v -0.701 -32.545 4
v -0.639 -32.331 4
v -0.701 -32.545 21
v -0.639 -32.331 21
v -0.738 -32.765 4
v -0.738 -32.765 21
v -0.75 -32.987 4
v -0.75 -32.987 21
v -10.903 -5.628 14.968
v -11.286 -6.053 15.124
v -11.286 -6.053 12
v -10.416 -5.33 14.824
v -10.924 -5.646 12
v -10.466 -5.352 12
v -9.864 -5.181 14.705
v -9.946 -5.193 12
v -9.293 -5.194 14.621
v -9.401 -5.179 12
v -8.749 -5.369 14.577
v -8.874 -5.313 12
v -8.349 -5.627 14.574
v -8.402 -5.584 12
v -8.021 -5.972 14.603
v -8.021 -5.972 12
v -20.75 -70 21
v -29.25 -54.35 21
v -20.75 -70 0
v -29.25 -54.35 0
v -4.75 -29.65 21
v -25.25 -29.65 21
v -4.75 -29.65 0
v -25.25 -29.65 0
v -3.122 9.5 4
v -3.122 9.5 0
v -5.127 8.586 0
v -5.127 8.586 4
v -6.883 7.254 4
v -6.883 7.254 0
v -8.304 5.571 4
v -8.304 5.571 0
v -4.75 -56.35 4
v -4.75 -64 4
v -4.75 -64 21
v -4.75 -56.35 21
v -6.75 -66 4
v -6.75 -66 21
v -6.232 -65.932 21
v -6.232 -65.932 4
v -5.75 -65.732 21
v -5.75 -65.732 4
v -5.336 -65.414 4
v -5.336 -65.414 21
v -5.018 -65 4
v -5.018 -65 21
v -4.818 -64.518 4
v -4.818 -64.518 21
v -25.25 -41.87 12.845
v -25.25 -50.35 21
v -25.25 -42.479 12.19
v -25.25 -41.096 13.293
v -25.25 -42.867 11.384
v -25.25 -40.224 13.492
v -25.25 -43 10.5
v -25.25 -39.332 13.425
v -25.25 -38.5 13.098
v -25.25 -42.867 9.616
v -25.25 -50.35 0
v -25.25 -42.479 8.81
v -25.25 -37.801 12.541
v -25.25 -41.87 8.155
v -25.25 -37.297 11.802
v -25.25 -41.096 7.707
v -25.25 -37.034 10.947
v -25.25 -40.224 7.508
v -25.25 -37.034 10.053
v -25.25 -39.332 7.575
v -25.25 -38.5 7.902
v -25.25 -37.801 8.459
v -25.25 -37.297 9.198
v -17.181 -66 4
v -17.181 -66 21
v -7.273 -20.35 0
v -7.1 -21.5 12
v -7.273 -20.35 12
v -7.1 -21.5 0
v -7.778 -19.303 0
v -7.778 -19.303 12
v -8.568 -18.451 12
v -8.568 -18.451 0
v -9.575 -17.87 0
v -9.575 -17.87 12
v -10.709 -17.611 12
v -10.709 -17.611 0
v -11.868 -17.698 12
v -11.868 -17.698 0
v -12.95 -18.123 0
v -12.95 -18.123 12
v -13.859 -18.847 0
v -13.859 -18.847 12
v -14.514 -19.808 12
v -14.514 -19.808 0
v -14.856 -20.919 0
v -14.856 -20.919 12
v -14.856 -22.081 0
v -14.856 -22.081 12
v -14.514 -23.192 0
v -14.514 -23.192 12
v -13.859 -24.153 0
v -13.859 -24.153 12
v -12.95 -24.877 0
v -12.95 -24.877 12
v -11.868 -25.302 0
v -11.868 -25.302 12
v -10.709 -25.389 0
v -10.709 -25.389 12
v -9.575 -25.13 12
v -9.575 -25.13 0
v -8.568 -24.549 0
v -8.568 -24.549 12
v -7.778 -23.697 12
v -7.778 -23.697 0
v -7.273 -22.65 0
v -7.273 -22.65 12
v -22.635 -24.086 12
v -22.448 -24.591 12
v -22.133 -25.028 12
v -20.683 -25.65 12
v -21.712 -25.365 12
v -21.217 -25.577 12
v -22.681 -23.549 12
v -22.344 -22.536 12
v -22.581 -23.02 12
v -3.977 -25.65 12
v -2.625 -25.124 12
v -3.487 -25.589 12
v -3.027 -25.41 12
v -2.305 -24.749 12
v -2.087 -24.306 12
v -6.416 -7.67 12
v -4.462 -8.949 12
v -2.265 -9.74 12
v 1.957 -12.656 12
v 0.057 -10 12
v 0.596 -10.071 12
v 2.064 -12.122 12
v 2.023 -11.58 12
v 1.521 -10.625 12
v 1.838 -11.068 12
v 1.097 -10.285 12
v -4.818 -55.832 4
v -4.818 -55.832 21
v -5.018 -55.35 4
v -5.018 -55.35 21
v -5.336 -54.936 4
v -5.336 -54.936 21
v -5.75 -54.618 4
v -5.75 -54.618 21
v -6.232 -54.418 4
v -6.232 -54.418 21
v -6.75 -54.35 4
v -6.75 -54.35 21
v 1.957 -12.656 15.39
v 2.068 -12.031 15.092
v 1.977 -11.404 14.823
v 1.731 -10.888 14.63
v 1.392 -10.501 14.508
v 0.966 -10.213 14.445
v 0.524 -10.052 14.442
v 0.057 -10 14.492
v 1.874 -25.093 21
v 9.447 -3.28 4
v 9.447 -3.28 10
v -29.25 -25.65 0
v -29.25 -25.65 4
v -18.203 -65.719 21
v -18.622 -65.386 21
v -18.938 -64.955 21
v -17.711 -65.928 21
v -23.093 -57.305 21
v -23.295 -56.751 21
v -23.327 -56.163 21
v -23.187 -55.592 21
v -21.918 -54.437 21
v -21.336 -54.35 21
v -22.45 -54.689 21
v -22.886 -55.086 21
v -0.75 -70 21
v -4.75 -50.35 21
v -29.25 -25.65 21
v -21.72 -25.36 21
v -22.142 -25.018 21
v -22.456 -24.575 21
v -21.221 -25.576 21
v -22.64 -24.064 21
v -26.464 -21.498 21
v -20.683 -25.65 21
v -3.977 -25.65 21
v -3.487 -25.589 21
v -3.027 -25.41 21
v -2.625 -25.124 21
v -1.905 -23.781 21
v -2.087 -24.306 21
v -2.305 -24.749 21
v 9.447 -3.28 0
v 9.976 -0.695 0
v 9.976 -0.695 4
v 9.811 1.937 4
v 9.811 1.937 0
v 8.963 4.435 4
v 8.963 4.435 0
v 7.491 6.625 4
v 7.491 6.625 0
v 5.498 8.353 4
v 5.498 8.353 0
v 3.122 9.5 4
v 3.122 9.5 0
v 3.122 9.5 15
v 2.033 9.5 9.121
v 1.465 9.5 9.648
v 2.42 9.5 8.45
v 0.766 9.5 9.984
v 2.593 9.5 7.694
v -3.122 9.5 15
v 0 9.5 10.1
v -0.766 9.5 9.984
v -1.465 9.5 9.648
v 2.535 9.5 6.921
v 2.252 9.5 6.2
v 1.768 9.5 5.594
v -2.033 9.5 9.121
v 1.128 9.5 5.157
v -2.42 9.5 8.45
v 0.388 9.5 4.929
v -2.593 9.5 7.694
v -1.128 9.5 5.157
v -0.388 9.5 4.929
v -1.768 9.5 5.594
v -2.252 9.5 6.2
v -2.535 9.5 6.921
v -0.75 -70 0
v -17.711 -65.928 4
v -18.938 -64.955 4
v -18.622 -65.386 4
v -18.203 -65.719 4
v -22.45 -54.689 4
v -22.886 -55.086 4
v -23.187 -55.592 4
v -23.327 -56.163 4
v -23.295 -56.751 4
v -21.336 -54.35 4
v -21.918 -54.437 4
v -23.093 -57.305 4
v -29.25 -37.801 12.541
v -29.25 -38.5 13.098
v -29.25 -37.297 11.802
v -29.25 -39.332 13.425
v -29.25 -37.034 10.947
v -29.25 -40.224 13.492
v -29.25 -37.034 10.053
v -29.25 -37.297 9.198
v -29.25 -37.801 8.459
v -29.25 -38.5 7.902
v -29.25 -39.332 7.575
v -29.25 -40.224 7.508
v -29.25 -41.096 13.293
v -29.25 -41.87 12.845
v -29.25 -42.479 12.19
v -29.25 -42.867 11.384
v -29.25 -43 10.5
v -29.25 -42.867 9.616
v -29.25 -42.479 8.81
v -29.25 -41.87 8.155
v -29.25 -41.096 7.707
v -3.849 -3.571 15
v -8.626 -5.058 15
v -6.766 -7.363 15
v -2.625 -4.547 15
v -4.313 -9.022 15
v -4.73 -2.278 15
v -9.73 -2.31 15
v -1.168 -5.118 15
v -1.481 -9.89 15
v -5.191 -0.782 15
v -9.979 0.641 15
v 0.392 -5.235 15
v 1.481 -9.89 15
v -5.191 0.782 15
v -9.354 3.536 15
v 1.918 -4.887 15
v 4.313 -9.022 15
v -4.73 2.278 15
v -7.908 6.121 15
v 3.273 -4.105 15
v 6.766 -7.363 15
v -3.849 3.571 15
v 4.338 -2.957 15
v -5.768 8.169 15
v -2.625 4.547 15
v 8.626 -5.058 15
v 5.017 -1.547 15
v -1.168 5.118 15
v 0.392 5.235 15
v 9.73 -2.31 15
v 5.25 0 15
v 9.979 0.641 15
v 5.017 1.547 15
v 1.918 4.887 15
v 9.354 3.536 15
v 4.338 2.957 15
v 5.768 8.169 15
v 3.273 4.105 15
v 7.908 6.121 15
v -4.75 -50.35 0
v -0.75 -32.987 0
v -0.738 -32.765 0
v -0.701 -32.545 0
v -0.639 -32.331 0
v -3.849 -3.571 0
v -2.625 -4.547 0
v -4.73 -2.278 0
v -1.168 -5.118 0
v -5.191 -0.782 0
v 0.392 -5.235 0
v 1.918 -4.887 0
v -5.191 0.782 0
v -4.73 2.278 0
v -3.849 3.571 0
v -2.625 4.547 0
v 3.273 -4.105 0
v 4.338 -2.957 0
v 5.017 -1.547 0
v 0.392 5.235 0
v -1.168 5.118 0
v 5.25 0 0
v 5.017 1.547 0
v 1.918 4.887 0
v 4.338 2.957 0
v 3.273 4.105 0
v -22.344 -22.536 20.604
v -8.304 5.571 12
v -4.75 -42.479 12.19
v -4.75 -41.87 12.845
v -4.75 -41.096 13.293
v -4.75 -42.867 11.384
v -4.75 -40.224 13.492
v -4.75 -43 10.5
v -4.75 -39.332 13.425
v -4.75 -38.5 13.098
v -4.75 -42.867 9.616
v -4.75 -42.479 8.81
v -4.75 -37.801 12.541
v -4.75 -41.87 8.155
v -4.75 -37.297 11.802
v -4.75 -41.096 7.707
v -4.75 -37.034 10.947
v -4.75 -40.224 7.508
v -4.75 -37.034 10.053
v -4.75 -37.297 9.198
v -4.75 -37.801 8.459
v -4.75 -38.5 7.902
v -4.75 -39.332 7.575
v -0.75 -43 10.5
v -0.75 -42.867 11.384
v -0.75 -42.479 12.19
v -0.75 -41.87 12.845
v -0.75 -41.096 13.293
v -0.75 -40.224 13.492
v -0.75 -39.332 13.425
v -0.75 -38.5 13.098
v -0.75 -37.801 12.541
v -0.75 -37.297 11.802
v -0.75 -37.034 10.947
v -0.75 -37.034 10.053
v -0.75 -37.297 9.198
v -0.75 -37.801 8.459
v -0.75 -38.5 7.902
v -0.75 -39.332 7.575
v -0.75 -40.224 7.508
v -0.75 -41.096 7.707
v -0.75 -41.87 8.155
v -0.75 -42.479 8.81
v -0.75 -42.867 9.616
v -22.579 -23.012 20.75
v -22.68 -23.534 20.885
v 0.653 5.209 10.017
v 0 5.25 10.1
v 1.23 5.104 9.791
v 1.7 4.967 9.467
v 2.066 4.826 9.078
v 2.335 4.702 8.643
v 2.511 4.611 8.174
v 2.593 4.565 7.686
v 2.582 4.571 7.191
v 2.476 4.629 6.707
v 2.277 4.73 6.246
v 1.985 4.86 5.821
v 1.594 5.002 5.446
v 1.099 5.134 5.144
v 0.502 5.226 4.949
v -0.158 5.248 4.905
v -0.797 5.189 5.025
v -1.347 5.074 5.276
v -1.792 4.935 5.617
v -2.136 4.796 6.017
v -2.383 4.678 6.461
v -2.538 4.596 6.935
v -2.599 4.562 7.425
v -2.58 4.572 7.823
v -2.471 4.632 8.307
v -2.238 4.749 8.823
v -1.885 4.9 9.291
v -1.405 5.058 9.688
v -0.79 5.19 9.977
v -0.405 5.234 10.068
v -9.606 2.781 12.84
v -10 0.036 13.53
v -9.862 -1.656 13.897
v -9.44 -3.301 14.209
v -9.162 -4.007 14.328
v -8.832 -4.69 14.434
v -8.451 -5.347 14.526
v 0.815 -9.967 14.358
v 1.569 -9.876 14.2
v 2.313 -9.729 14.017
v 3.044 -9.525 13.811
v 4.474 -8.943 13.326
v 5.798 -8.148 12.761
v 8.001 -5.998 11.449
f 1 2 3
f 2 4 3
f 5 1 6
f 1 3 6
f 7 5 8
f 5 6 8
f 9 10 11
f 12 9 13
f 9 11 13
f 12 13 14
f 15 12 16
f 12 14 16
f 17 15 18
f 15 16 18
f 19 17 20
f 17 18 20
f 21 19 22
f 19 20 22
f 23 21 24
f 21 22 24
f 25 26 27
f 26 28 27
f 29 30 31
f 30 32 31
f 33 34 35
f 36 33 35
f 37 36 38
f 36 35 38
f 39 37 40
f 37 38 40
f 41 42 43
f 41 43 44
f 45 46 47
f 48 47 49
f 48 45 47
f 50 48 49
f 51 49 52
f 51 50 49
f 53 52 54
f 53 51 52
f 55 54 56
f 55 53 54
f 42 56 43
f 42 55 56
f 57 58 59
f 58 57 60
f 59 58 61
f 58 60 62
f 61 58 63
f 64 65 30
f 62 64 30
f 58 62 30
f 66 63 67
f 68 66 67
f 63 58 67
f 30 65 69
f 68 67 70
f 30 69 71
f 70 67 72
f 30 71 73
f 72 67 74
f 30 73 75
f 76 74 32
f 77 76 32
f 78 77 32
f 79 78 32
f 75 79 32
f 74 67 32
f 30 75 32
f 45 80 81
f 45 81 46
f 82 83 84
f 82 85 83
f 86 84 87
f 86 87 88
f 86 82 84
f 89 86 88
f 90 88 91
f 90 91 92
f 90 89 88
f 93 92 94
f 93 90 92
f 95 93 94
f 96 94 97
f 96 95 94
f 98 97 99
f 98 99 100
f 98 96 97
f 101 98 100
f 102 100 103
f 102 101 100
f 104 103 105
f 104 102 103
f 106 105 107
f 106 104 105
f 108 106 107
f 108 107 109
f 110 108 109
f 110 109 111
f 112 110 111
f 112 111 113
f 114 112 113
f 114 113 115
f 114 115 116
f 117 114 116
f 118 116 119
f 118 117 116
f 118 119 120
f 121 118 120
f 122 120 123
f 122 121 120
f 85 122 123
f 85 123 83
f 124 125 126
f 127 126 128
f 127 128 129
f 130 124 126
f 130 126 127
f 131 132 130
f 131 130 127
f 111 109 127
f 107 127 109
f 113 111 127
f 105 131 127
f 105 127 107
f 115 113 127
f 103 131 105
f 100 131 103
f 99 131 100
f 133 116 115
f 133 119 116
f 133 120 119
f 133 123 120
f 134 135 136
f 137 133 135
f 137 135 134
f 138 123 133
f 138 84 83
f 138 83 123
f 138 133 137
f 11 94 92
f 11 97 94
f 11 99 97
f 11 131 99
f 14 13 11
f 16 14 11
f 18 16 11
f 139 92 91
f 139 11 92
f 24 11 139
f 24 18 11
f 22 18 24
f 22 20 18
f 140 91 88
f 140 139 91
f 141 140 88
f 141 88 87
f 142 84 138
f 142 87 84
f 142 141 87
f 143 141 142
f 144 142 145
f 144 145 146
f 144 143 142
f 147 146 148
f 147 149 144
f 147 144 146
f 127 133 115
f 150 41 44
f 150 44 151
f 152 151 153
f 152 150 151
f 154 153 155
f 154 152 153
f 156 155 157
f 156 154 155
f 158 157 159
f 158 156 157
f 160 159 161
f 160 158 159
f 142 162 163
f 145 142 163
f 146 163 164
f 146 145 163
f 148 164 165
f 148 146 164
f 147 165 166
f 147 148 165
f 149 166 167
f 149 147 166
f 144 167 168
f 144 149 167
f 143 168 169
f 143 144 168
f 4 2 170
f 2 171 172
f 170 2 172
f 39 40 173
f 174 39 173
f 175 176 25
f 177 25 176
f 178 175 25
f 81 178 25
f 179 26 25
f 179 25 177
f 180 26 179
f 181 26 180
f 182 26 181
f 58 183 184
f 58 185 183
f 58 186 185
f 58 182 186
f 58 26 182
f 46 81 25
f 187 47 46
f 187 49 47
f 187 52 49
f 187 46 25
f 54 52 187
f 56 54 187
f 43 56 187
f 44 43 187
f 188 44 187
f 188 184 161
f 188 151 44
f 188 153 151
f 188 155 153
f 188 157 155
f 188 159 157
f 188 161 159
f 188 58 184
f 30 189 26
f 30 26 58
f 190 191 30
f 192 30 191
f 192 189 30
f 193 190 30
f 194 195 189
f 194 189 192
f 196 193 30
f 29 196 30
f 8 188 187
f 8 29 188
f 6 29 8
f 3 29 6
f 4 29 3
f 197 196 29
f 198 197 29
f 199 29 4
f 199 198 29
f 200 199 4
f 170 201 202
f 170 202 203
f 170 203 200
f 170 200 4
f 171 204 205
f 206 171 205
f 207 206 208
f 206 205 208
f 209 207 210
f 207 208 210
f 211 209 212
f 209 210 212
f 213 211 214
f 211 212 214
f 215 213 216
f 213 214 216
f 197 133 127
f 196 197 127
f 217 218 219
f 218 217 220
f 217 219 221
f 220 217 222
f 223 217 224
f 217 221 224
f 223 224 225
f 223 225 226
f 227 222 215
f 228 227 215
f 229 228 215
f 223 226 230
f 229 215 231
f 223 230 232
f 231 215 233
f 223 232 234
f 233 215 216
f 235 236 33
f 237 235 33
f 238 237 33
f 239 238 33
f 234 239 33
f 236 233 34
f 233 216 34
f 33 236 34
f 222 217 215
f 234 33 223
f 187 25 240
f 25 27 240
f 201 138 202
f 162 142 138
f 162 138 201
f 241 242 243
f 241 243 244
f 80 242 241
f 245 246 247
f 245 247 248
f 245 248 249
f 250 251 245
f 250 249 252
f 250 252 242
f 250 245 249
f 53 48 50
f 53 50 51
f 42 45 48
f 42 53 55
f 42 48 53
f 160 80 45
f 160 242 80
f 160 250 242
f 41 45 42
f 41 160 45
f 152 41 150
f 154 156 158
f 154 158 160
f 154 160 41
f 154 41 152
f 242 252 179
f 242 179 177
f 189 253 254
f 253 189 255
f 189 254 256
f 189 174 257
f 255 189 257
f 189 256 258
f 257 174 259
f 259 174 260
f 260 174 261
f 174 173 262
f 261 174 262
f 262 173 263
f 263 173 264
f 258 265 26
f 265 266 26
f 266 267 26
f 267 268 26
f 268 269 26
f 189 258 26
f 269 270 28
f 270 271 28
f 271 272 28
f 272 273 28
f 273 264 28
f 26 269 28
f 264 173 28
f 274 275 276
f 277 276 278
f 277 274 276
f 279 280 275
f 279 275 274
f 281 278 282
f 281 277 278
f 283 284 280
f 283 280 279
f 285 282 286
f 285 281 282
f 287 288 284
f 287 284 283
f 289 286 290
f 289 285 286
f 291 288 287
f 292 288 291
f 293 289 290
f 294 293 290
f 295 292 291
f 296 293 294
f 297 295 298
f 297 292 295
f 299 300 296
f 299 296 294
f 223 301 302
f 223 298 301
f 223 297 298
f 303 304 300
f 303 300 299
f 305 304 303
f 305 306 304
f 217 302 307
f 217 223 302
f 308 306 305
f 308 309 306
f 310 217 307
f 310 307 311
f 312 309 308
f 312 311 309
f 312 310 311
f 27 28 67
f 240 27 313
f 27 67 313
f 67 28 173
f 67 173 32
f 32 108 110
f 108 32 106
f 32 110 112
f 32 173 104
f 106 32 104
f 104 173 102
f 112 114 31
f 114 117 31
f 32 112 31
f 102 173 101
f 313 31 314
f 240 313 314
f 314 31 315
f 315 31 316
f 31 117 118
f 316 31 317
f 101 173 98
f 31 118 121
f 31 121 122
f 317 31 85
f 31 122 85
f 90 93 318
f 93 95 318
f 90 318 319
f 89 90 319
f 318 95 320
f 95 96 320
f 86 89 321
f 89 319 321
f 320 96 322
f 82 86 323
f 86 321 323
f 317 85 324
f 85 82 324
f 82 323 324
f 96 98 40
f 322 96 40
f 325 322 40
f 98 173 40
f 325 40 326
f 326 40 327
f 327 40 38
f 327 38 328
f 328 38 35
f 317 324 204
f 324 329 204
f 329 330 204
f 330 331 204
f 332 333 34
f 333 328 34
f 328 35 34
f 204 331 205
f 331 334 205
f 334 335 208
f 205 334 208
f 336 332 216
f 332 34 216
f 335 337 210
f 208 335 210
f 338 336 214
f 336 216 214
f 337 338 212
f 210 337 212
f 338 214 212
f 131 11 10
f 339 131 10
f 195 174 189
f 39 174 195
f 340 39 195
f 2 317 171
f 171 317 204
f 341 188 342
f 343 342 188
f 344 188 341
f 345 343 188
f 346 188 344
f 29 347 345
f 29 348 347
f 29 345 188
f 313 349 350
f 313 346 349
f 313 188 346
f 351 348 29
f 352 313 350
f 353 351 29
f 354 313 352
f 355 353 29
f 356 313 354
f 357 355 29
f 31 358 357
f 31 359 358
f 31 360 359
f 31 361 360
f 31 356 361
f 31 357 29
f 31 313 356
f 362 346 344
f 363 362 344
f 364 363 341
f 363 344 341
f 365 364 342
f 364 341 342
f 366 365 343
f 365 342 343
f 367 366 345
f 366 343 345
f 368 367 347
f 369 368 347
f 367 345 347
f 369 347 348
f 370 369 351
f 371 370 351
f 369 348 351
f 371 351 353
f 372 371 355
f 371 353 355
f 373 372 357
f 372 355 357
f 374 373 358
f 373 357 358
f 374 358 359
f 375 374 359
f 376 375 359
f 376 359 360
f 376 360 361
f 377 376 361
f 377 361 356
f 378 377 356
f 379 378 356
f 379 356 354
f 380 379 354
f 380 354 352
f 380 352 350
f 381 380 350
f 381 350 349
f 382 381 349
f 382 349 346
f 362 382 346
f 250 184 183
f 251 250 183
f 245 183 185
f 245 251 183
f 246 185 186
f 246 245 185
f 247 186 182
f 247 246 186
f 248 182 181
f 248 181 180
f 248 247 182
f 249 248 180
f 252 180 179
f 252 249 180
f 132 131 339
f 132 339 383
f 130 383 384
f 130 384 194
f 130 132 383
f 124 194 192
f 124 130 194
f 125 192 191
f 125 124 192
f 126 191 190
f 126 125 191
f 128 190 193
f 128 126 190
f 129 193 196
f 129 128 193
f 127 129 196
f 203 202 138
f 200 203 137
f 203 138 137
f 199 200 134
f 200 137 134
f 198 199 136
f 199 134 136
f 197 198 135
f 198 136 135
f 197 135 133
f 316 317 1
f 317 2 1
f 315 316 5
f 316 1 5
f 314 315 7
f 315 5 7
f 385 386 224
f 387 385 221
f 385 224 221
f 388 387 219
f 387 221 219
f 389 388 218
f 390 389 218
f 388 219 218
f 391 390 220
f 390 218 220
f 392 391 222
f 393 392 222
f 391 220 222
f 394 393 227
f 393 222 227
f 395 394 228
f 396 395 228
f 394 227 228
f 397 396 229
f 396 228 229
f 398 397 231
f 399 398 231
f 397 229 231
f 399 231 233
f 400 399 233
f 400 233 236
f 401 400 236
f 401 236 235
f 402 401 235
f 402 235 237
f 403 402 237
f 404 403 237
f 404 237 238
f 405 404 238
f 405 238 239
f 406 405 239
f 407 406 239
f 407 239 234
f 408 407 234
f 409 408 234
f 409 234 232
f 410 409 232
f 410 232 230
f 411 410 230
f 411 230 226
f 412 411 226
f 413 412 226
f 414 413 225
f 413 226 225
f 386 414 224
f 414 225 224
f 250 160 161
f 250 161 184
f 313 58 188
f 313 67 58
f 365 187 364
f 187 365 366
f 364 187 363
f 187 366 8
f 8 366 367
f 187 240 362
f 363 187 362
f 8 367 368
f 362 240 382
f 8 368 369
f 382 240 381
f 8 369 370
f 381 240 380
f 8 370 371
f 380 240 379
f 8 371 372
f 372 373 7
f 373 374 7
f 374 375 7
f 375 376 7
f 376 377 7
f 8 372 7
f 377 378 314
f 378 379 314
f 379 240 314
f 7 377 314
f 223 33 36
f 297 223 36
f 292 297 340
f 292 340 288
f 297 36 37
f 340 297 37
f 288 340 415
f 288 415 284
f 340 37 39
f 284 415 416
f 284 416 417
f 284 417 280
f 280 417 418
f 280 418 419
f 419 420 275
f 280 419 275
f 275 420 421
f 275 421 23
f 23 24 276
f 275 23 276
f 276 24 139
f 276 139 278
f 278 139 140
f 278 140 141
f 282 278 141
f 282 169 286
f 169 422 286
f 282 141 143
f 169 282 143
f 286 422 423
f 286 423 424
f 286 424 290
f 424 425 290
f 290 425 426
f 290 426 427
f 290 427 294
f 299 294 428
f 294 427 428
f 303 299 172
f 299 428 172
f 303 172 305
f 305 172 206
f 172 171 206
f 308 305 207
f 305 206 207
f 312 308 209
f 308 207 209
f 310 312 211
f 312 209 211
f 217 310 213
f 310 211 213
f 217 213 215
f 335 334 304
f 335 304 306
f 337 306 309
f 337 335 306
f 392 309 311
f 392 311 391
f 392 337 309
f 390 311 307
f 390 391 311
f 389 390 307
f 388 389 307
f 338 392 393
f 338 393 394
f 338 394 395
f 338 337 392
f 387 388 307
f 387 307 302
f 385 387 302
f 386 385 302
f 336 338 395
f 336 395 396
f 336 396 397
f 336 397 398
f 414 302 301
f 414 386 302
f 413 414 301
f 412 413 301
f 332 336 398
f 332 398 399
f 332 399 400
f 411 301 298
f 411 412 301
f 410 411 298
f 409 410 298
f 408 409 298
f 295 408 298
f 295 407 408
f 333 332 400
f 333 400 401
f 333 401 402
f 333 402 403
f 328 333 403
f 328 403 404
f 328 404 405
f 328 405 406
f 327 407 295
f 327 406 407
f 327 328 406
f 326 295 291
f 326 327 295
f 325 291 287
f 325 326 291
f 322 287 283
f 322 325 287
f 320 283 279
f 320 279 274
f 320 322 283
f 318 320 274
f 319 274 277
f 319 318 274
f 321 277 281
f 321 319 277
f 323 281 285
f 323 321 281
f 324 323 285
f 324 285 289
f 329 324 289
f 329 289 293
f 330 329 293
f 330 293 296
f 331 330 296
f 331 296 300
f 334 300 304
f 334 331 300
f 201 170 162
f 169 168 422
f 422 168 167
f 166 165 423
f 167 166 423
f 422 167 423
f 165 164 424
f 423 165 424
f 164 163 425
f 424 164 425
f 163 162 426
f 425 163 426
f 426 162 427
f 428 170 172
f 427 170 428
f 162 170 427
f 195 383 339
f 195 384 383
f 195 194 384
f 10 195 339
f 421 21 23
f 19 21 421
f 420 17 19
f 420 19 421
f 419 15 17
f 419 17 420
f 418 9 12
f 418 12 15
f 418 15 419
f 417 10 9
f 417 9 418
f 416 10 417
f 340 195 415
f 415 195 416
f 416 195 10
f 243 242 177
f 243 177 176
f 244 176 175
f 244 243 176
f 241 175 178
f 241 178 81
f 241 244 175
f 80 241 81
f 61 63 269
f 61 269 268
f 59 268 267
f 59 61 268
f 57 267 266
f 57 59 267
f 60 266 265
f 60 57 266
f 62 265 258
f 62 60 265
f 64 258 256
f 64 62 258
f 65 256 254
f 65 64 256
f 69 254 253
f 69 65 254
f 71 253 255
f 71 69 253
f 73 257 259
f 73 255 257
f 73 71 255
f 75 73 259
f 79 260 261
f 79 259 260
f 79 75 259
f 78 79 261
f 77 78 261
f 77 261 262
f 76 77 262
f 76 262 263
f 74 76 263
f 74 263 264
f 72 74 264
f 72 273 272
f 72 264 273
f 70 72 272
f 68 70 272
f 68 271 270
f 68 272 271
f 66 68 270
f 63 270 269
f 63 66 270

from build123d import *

# Parameters (mm, degrees)
SKETCH1_R               = 5.25
SKETCH1_R_2             = 3.9
SKETCH1_W               = 20.5
SKETCH1_H               = 20.7
BOSS_EXTRUDE1_DEPTH     = 4
SKETCH2_R               = 5.25
BOSS_EXTRUDE2_DEPTH     = 11
SKETCH3_W               = 20.5
SKETCH3_H               = 20.7
BOSS_EXTRUDE3_DEPTH     = 17
BOSS_EXTRUDE4_DEPTH     = 4
BOSS_EXTRUDE6_DEPTH     = 4
FILLET8_R               = 2
SKETCH7_R               = 2.6
CUT_EXTRUDE1_DEPTH      = 6
SKETCH9_R               = 3
CUT_EXTRUDE2_DEPTH      = 25.5
CUT_EXTRUDE2_DEPTH_BACK = 15.75
SKETCH10_R              = 3.9
BOSS_EXTRUDE7_DEPTH     = 8


with BuildPart() as part:
    # Sketch1 → Boss-Extrude1 (new body)
    with BuildSketch(Plane.XY):
        with BuildLine():
            Line((-29.25, -25.65), (-29.25, -54.35))
            Line((-29.25, -54.35), (-20.75, -70))
            Line((-20.75, -70), (-0.75, -70))
            Line((-0.75, -70), (-0.75, -32.65))
            Line((-0.75, -32.65), (9.446850202, -3.279789821))
            ThreePointArc((9.446850202, -3.279789821), (8.962582875, 4.435325039), (3.122498999, 9.5))
            Line((3.122498999, 9.5), (-3.122498999, 9.5))
            ThreePointArc((-3.122498999, 9.5), (-6.041680661, 7.968569181), (-8.304318811, 5.571201763))
            Line((-8.304318811, 5.571201763), (-29.25, -25.65))
        make_face()
        Circle(SKETCH1_R, mode=Mode.SUBTRACT)
        with Locations((-11, -21.5)):
            Circle(SKETCH1_R_2, mode=Mode.SUBTRACT)
        with Locations((-15, -40)):
            Rectangle(SKETCH1_W, SKETCH1_H, mode=Mode.SUBTRACT)
    extrude(amount=BOSS_EXTRUDE1_DEPTH)

    # Sketch2 → Boss-Extrude2 (add)
    with BuildSketch(Plane.XY.offset(4)):
        with BuildLine():
            Line((3.122498999, 9.5), (-3.122498999, 9.5))
            ThreePointArc((-3.122498999, 9.5), (0, -10), (3.122498999, 9.5))
        make_face()
        Circle(SKETCH2_R, mode=Mode.SUBTRACT)
    extrude(amount=BOSS_EXTRUDE2_DEPTH)

    # Sketch3 → Boss-Extrude3 (add)
    with BuildSketch(Plane.XY.offset(4)):
        Polygon((-29.25, -25.65), (-29.25, -54.35), (-20.75, -70), (-0.75, -70), (-0.75, -25.65), align=None)
        with Locations((-15, -40)):
            Rectangle(SKETCH3_W, SKETCH3_H, mode=Mode.SUBTRACT)
        with BuildLine():
            Line((-6.75, -54.35), (-21.33587702, -54.35))
            ThreePointArc((-21.33587702, -54.35), (-23.054759053, -55.327530168), (-23.093382043, -57.304555444))
            Line((-23.093382043, -57.304555444), (-18.938429966, -64.954555444))
            ThreePointArc((-18.938429966, -64.954555444), (-18.203394775, -65.718882033), (-17.180924944, -66))
            Line((-17.180924944, -66), (-6.75, -66))
            ThreePointArc((-6.75, -66), (-5.335786438, -65.414213562), (-4.75, -64))
            Line((-4.75, -64), (-4.75, -56.35))
            ThreePointArc((-4.75, -56.35), (-5.335786438, -54.935786438), (-6.75, -54.35))
        make_face(mode=Mode.SUBTRACT)
    extrude(amount=BOSS_EXTRUDE3_DEPTH)

    # Sketch4 → Boss-Extrude4 (add)
    with BuildSketch(Plane(origin=(-8.304318811, 5.571201763, 0), x_dir=(0, 0, 1), z_dir=(-0.830431881, 0.557120176, 0))):
        Polygon((4, -37.596342907), (21, -37.596342907), (21, -32.596342907), (12, 0), (4, 0), align=None)
    extrude(amount=-BOSS_EXTRUDE4_DEPTH)

    # Sketch6 → Boss-Extrude6 (add)
    with BuildSketch(Plane(origin=(9.446850202, -3.279789821, 0), x_dir=(0, 0, -1), z_dir=(0.94468502, -0.327978982, 0))):
        Polygon((-4, -31.089950145), (-21, -31.089950145), (-21, -23.089950145), (-10, 0), (-4, 0), align=None)
    extrude(amount=-BOSS_EXTRUDE6_DEPTH)

    # Fillet8
    fillet8_edges = [part.edges().sort_by_distance(p)[0] for p in [
        (-24.433229244, -25.65, 12.5),
        (-2.553931563, -25.65, 12.5),
        (3.044278264, -9.525354054, 8.905590949),
        (-9.439552697, -3.300733991, 9.104418373),
        (-0.75, -32.65, 10.5),
    ]]
    fillet(fillet8_edges, radius=FILLET8_R)

    # Sketch7 → Cut-Extrude1 (cut)
    with BuildSketch(Plane(origin=(0, 9.5, 0), x_dir=(1, 0, 0), z_dir=(0, 1, 0))):
        with Locations(Location((0, -7.5, 0), (0, 0, 270))):  # turned: the seam where the file's is
            Circle(SKETCH7_R)
    extrude(amount=-CUT_EXTRUDE1_DEPTH, mode=Mode.SUBTRACT)

    # Sketch9 → Cut-Extrude2 (cut, two sides)
    with BuildSketch(Plane.ZY.offset(4.75)) as cut_extrude2_sk:
        with Locations(Location((10.5, -40, 0), (0, 0, 270))):  # turned: the seam where the file's is
            Circle(SKETCH9_R)
    extrude(amount=CUT_EXTRUDE2_DEPTH, mode=Mode.SUBTRACT)
    extrude(cut_extrude2_sk.sketch, amount=-CUT_EXTRUDE2_DEPTH_BACK, mode=Mode.SUBTRACT)

    # Sketch10 → Boss-Extrude7 (add)
    with BuildSketch(Plane.XY.offset(4)):
        with BuildLine():
            Line((-11.28568656, -6.052543173), (-22.343947541, -22.535759647))
            ThreePointArc((-22.343947541, -22.535759647), (-22.44780482, -24.591148048), (-20.683083779, -25.65))
            Line((-20.683083779, -25.65), (-3.976672485, -25.65))
            ThreePointArc((-3.976672485, -25.65), (-2.817344215, -25.279711006), (-2.087302444, -24.305957964))
            Line((-2.087302444, -24.305957964), (1.957451524, -12.655764834))
            ThreePointArc((1.957451524, -12.655764834), (1.69449722, -10.835860199), (0.05673457, -9.999839058))
            ThreePointArc((0.05673457, -9.999839058), (-4.462214417, -8.949225805), (-8.020685665, -5.972319605))
            ThreePointArc((-8.020685665, -5.972319605), (-9.6739495, -5.167386975), (-11.28568656, -6.052543173))
        make_face()
        with Locations((-11, -21.5)):
            Circle(SKETCH10_R, mode=Mode.SUBTRACT)
    extrude(amount=BOSS_EXTRUDE7_DEPTH)


solid = part.part
